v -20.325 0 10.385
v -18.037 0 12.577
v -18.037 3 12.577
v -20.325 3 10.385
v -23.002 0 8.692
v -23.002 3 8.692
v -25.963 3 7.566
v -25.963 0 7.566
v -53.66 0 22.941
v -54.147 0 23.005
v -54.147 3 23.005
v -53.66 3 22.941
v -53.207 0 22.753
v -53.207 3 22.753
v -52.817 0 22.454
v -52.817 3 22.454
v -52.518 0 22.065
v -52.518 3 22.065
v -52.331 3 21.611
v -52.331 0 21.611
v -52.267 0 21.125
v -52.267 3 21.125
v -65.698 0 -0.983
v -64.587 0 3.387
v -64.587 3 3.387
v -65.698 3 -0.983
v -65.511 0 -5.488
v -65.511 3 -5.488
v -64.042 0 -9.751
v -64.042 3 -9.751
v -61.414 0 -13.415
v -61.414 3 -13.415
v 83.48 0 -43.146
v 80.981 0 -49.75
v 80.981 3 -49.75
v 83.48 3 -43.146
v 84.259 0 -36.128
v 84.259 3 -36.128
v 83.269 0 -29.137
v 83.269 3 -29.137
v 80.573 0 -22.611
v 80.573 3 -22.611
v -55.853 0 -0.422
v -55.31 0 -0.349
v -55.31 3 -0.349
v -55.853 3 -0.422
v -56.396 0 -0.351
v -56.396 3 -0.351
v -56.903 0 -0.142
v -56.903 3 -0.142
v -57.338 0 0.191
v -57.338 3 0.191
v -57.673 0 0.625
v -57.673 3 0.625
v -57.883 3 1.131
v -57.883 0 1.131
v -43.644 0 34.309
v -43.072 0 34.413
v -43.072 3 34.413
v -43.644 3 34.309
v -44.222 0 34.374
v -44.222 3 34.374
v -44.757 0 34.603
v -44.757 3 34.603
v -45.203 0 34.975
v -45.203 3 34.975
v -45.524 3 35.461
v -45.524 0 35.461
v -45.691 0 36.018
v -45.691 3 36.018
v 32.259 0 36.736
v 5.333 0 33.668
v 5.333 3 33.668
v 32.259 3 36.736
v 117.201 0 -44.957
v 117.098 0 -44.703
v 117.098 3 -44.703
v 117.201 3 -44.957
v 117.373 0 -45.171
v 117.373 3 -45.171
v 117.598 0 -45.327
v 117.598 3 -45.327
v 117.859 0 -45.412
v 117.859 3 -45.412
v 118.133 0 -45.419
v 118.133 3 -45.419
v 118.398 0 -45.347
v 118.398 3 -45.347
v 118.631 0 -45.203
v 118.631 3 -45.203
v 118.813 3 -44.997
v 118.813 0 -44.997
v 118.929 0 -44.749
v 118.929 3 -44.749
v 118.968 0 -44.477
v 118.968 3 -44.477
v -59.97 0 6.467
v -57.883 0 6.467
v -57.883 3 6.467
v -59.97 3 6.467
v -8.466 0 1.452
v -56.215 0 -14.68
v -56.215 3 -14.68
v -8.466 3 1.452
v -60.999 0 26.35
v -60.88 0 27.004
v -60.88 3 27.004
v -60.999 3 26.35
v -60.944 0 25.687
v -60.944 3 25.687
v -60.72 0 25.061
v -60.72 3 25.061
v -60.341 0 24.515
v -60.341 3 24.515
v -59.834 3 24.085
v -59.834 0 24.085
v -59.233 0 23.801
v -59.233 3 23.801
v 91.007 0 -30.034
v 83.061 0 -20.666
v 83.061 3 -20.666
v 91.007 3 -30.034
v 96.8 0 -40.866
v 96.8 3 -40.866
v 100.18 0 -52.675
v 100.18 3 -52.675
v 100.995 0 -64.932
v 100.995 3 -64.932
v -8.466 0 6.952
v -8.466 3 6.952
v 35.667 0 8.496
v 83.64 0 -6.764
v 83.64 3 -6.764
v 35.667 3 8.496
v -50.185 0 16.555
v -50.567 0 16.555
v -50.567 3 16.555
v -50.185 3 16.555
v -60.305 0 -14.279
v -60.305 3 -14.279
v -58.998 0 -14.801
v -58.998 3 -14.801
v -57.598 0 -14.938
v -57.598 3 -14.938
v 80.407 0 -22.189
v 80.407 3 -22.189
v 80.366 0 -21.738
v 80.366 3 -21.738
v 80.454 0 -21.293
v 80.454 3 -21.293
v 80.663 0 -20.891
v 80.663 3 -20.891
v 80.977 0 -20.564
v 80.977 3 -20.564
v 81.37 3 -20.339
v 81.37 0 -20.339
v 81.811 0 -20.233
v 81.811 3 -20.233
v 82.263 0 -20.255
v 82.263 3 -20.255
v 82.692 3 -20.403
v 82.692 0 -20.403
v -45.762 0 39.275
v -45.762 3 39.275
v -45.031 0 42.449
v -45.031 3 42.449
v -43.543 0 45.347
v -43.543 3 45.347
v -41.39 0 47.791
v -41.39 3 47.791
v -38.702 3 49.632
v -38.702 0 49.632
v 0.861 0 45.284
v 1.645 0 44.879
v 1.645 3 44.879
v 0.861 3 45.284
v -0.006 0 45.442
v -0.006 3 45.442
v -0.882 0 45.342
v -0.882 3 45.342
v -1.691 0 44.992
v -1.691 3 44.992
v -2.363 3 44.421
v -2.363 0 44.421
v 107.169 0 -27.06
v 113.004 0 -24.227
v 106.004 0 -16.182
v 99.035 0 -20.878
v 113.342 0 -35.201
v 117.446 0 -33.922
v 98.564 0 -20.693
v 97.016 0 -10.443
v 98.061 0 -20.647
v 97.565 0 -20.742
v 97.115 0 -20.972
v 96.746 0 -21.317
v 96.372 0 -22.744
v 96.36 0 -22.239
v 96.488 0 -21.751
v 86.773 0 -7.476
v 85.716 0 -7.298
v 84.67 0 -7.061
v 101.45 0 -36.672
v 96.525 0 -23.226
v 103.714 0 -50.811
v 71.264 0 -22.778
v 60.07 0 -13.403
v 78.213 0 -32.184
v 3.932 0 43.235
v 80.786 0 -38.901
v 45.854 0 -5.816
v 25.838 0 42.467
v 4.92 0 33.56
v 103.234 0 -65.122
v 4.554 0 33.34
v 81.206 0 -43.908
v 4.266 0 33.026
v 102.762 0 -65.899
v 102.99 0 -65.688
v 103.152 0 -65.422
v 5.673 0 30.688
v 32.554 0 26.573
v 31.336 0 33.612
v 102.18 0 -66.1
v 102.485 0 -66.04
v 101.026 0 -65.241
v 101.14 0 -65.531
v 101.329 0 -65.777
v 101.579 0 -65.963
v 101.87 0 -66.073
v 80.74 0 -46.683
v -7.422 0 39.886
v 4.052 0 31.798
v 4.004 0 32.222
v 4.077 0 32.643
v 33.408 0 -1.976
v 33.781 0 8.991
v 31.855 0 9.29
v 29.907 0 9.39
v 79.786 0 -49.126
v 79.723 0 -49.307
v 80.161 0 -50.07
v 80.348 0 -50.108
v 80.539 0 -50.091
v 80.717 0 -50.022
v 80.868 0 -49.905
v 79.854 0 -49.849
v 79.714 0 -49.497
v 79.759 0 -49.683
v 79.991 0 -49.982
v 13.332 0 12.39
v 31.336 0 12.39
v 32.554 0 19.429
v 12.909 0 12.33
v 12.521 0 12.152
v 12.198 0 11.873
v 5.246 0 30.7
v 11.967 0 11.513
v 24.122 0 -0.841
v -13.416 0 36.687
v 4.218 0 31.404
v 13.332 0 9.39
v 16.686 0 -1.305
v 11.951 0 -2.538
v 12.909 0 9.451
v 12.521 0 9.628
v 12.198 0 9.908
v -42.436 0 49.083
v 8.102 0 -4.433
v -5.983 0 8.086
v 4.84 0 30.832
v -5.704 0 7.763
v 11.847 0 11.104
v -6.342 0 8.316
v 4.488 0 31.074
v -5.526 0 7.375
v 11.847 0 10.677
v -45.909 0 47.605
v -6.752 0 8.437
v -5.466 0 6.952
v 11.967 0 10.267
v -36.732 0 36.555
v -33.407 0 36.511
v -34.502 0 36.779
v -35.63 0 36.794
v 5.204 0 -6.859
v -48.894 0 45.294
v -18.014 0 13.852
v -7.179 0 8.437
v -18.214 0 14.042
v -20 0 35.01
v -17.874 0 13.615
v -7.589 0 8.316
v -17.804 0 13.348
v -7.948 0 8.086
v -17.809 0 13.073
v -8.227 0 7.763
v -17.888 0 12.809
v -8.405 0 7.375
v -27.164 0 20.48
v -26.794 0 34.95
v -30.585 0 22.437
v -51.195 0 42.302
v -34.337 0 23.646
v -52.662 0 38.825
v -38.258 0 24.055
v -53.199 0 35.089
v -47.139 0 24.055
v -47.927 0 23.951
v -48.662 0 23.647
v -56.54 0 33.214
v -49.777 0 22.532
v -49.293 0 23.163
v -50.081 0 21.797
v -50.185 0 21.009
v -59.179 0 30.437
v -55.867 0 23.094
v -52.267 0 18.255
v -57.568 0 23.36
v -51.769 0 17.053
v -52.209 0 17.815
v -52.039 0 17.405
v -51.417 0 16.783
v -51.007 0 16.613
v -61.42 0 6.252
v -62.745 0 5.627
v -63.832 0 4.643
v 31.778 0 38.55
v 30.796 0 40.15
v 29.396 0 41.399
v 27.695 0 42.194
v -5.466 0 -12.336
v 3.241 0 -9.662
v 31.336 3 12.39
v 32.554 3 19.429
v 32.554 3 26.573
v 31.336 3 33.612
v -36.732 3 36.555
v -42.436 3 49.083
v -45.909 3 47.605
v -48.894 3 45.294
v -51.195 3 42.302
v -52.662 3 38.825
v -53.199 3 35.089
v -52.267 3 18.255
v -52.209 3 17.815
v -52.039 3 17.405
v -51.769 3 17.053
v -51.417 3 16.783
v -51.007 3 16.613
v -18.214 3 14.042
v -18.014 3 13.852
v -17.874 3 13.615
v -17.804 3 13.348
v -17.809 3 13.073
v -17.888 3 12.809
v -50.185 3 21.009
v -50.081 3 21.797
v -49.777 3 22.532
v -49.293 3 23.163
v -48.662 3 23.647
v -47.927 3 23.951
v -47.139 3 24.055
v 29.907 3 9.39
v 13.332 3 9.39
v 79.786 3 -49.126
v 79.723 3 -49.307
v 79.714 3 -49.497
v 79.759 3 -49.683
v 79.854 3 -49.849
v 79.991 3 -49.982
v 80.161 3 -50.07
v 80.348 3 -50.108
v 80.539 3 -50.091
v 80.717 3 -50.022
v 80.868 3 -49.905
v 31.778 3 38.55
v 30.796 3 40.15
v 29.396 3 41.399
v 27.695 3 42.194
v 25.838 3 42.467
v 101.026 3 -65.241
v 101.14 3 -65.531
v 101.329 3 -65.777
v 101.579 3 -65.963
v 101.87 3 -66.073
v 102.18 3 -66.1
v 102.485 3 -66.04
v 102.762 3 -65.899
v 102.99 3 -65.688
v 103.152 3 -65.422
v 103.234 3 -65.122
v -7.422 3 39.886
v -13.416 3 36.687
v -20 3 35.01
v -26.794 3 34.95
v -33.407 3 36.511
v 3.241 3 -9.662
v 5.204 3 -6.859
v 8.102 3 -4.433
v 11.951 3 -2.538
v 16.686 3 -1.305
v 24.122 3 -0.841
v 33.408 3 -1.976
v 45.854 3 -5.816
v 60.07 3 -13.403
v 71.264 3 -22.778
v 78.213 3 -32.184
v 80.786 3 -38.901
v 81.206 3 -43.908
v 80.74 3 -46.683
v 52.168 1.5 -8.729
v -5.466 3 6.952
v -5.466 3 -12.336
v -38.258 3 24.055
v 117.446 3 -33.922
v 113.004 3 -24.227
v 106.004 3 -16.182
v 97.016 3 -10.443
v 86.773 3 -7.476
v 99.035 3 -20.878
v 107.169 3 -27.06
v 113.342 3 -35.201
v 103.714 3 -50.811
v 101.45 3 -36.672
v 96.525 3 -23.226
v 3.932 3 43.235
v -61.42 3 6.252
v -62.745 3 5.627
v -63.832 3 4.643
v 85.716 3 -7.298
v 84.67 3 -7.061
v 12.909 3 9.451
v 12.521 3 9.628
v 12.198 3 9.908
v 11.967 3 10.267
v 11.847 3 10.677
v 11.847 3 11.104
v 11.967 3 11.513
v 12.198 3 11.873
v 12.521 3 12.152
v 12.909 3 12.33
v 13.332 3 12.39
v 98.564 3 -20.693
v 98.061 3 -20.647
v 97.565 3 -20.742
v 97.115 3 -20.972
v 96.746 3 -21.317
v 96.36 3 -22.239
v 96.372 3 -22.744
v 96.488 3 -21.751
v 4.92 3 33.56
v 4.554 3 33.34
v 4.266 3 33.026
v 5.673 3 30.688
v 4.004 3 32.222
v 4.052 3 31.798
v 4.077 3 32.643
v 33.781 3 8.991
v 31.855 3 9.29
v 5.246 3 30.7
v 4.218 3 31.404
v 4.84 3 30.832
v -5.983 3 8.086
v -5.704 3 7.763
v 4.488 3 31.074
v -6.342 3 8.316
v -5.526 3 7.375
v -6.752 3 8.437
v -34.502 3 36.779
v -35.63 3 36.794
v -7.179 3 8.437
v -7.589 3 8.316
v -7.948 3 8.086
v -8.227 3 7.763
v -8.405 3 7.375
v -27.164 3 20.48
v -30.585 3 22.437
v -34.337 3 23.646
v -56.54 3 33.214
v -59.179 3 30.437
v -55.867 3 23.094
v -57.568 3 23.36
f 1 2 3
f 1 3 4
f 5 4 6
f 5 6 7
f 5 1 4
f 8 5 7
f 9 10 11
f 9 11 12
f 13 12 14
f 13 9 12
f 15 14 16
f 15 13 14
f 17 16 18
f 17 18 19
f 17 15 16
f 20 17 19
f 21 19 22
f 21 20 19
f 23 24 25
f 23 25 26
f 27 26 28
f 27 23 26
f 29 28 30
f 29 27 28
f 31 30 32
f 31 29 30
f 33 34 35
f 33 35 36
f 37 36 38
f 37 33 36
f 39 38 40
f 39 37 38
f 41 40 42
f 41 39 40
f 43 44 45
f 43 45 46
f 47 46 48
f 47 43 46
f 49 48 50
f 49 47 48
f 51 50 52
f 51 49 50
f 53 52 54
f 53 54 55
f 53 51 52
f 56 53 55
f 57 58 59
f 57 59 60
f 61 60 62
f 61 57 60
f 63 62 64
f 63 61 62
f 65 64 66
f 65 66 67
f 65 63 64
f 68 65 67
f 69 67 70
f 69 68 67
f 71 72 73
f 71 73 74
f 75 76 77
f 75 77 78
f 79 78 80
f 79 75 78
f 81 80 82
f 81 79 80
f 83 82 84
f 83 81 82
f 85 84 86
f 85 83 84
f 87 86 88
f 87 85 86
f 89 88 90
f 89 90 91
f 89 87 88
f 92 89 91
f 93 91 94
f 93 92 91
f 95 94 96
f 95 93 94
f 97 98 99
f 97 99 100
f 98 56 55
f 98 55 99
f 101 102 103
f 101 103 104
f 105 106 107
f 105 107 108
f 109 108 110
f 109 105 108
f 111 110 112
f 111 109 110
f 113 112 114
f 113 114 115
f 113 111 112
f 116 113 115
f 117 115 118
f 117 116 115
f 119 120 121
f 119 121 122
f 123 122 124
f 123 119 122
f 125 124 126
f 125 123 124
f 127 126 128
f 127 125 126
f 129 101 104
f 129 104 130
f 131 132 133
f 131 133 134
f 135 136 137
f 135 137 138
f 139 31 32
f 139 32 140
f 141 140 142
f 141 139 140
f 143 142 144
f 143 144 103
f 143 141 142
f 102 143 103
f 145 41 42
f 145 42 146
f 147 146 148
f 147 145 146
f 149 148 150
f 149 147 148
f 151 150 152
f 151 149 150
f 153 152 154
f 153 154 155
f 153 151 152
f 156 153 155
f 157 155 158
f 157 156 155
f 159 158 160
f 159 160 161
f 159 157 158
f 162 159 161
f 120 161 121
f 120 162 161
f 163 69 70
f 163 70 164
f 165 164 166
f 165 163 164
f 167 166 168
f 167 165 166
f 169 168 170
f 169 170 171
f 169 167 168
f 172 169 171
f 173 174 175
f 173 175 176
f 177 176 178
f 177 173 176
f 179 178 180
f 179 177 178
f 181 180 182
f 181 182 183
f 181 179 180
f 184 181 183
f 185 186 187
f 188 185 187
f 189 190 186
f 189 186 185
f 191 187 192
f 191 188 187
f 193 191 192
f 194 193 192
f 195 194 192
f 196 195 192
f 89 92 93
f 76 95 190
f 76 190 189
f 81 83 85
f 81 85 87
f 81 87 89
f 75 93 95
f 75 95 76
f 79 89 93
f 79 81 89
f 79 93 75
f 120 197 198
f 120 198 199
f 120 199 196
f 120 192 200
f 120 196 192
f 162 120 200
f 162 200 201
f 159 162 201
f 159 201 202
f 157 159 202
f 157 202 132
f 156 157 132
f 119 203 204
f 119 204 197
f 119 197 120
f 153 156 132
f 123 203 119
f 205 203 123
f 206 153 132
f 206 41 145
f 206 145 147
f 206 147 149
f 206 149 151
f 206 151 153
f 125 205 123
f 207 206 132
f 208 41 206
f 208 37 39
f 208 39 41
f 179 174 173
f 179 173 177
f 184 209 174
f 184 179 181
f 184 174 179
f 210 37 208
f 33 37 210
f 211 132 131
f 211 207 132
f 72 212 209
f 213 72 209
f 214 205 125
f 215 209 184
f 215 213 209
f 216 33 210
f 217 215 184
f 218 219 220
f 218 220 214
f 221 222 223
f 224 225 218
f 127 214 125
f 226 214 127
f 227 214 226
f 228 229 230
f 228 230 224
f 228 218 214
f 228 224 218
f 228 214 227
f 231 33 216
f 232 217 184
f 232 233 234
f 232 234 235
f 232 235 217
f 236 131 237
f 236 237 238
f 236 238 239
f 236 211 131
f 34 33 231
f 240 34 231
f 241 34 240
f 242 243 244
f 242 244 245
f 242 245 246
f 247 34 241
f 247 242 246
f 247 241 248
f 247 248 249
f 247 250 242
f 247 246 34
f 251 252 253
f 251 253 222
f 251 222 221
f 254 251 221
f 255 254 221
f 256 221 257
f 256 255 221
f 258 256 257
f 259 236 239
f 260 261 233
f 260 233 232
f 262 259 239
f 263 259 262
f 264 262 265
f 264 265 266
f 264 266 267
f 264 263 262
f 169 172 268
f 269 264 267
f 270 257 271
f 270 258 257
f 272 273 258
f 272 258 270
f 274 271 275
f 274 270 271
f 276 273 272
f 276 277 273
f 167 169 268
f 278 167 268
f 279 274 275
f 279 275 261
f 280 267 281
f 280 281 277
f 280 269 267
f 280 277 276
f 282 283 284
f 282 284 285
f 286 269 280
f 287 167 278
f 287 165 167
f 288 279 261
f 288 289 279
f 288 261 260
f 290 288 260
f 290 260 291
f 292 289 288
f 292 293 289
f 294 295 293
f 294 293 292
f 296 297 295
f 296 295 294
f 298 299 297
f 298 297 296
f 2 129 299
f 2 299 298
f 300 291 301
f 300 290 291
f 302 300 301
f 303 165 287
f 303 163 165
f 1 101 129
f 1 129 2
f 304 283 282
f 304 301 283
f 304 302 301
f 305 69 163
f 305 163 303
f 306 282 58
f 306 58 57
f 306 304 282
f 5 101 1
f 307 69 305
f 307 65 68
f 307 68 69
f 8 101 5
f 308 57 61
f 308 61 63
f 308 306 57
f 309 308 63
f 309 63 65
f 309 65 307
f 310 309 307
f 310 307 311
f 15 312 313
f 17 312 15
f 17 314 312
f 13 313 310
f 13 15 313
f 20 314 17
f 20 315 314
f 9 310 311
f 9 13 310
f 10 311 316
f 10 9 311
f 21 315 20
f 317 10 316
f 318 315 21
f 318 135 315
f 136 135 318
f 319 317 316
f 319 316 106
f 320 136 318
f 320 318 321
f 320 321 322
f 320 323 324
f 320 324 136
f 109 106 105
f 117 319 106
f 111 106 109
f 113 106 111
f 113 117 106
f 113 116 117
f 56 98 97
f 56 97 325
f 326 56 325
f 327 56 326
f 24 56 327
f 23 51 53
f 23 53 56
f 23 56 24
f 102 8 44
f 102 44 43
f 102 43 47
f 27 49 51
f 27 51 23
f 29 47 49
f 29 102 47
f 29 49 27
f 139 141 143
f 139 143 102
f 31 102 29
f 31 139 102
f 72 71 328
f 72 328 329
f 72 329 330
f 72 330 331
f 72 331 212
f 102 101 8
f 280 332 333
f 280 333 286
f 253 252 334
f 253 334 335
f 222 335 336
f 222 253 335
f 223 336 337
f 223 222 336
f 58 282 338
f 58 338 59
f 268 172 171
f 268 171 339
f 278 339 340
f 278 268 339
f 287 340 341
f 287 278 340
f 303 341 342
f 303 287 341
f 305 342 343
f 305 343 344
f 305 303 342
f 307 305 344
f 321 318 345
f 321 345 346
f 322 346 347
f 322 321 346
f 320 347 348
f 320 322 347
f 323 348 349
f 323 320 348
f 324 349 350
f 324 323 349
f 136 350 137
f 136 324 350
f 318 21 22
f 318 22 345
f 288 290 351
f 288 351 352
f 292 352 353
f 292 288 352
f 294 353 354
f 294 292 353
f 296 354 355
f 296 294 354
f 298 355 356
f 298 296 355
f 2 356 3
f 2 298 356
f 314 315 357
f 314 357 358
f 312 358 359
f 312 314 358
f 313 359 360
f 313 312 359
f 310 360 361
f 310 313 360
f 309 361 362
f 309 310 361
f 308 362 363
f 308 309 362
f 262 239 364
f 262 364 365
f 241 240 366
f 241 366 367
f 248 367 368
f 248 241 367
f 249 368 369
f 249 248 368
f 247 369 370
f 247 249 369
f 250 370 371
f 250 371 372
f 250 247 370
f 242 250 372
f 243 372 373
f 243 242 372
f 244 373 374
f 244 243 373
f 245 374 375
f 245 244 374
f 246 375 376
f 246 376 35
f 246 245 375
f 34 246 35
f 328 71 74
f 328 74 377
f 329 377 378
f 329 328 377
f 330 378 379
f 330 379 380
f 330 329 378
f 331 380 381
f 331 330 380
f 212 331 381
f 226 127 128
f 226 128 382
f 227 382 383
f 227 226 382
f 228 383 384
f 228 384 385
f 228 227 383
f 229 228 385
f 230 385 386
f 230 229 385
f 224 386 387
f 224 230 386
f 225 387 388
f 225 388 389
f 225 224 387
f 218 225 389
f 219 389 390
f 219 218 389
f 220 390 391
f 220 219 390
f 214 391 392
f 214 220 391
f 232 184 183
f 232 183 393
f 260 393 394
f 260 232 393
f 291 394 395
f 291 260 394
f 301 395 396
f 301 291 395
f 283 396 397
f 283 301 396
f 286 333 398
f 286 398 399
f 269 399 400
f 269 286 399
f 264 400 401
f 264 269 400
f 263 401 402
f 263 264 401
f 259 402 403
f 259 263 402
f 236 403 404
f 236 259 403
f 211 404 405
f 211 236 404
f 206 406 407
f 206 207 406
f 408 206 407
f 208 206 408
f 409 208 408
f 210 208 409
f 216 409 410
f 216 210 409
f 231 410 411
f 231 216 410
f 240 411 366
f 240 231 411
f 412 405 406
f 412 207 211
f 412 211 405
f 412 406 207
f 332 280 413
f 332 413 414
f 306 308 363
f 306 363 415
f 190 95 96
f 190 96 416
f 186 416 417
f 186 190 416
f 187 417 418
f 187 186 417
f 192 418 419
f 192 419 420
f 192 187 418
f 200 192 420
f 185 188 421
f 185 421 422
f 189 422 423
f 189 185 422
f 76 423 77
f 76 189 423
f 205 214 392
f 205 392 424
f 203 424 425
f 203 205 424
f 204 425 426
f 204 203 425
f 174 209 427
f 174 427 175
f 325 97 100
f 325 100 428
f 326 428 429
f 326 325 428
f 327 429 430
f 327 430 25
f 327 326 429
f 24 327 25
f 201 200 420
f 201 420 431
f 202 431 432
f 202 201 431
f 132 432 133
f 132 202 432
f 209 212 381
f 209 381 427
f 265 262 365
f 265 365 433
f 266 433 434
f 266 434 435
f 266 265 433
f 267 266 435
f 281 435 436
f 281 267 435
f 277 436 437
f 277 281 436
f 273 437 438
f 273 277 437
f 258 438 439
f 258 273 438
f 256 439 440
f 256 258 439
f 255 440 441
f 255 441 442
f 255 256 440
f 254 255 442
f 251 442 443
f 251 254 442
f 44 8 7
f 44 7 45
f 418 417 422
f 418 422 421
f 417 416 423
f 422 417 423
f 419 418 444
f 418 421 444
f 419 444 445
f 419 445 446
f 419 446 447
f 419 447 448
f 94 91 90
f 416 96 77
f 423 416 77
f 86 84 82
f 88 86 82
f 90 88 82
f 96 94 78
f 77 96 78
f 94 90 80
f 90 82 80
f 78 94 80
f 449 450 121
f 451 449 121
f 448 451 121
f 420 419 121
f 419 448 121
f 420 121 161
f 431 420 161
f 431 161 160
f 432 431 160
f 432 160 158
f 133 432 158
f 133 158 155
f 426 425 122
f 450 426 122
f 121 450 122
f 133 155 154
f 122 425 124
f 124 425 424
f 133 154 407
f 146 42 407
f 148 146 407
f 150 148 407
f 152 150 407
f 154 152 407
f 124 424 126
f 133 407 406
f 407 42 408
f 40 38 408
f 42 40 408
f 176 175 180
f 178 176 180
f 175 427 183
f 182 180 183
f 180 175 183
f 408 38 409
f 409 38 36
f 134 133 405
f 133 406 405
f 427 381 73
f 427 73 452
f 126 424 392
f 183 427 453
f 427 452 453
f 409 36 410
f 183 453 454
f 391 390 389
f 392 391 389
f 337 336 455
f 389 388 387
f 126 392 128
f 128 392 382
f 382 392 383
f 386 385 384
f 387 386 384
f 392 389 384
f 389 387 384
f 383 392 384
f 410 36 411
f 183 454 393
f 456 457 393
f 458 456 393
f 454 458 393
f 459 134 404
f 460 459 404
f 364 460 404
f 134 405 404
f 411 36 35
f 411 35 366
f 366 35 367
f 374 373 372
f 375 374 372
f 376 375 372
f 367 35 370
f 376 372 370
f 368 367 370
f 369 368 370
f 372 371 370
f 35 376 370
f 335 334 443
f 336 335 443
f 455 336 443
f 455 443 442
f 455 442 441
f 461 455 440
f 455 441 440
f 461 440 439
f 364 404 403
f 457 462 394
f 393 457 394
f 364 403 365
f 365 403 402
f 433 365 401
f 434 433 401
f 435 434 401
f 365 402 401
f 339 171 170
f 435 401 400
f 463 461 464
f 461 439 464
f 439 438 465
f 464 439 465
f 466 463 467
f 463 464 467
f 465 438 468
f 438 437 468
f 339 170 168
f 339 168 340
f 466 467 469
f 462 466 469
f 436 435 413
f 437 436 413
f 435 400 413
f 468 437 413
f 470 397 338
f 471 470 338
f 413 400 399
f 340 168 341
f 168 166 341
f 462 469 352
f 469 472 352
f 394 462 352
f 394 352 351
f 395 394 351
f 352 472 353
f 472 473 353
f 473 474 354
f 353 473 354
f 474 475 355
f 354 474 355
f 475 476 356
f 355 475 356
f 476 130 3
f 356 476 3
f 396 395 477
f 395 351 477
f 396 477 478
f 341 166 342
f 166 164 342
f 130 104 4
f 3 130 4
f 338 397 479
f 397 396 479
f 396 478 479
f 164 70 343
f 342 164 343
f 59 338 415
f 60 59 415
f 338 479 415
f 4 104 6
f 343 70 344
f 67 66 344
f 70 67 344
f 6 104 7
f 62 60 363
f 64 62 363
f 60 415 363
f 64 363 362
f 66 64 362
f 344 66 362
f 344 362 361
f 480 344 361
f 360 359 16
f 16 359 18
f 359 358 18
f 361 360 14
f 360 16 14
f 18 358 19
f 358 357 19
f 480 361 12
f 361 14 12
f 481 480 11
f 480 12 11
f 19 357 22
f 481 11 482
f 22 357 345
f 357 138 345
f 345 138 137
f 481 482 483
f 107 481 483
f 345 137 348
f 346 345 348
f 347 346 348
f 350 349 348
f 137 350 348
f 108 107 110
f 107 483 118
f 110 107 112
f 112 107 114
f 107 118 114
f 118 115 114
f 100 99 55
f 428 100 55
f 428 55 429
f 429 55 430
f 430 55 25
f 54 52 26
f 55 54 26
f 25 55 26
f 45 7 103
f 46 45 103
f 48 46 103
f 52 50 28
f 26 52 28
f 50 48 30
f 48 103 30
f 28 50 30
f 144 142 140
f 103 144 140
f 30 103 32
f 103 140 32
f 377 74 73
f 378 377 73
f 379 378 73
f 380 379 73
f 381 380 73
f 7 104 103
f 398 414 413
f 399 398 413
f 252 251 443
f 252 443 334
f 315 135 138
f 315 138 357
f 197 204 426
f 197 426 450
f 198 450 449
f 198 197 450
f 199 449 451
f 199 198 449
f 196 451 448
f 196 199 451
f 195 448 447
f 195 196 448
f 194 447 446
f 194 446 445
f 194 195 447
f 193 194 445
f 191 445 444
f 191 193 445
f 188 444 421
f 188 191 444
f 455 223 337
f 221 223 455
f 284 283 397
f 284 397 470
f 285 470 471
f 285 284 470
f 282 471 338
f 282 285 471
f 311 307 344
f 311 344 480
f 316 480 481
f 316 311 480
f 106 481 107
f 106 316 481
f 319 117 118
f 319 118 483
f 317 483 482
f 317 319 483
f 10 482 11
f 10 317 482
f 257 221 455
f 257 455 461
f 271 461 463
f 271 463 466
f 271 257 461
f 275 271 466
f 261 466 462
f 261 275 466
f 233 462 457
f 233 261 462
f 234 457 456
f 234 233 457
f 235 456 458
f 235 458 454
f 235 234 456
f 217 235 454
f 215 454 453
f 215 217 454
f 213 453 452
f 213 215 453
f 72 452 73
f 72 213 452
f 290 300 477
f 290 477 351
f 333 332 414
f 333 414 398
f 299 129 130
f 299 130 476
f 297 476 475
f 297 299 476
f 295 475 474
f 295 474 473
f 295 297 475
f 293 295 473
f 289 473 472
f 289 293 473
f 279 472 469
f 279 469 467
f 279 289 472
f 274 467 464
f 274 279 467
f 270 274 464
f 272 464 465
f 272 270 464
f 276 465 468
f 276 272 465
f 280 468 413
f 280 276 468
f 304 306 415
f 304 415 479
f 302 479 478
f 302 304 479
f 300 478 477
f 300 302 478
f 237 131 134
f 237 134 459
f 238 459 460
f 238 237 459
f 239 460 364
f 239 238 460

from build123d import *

# Parameters (mm, degrees)
BOSS_EXTRUDE2_DEPTH = 3


with BuildPart() as part:
    # Sketch1 → Boss-Extrude2 (new body)
    with BuildSketch(Plane(origin=(0, 0, 0), x_dir=(1, 0, 0), z_dir=(0, 1, 0))):
        with BuildLine():
            Line((83.639689367, 6.764475065), (35.667186692, -8.49628906))
            ThreePointArc((35.667186692, -8.49628906), (32.821791297, -9.165503452), (29.907418735, -9.39034879))
            Line((29.907418735, -9.39034879), (13.331621464, -9.39034879))
            ThreePointArc((13.331621464, -9.39034879), (11.831621464, -10.89034879), (13.331621464, -12.39034879))
            Line((13.331621464, -12.39034879), (31.335553361, -12.39034879))
            ThreePointArc((31.335553361, -12.39034879), (32.706920816, -23.000925987), (31.335553361, -33.611503185))
            Line((31.335553361, -33.611503185), (5.672878156, -30.687610674))
            ThreePointArc((5.672878156, -30.687610674), (4.012715552, -32.008163637), (5.333268515, -33.668326241))
            Line((5.333268515, -33.668326241), (32.258758745, -36.73609835))
            ThreePointArc((32.258758745, -36.73609835), (30.141236011, -40.825580171), (25.83833159, -42.466548678))
            Line((25.83833159, -42.466548678), (3.931607644, -43.234741077))
            Line((3.931607644, -43.234741077), (1.645004408, -44.879459267))
            ThreePointArc((1.645004408, -44.879459267), (-0.44755249, -45.424610965), (-2.363050322, -44.421190413))
            ThreePointArc((-2.363050322, -44.421190413), (-16.657617756, -35.649988568), (-33.406545395, -36.511419261))
            ThreePointArc((-33.406545395, -36.511419261), (-35.065515769, -36.818007167), (-36.732015424, -36.555409102))
            Line((-36.732015424, -36.555409102), (-43.072013441, -34.41346595))
            ThreePointArc((-43.072013441, -34.41346595), (-44.756883472, -34.602804193), (-45.690953078, -36.017777677))
            ThreePointArc((-45.690953078, -36.017777677), (-44.377060251, -43.944176391), (-38.701961301, -49.631650596))
            ThreePointArc((-38.701961301, -49.631650596), (-48.89375638, -45.294039559), (-53.199015105, -35.088535957))
            ThreePointArc((-53.199015105, -35.088535957), (-57.963880411, -31.924307539), (-60.880420097, -27.003933658))
            ThreePointArc((-60.880420097, -27.003933658), (-60.719986784, -25.061085947), (-59.232742508, -23.80072864))
            ThreePointArc((-59.232742508, -23.80072864), (-56.720776297, -23.205324241), (-54.14697512, -23.005253893))
            ThreePointArc((-54.14697512, -23.005253893), (-52.817288904, -22.454479829), (-52.26651484, -21.124793613))
            Line((-52.26651484, -21.124793613), (-52.26651484, -18.255253893))
            ThreePointArc((-52.26651484, -18.255253893), (-51.768596368, -17.053172365), (-50.56651484, -16.555253893))
            Line((-50.56651484, -16.555253893), (-50.18504008, -16.555253893))
            Line((-50.18504008, -16.555253893), (-50.18504008, -21.008976099))
            ThreePointArc((-50.18504008, -21.008976099), (-49.292805972, -23.163019785), (-47.138762286, -24.055253893))
            Line((-47.138762286, -24.055253893), (-38.258057554, -24.055253893))
            ThreePointArc((-38.258057554, -24.055253893), (-32.429820226, -23.139270307), (-27.163537606, -20.479638066))
            Line((-27.163537606, -20.479638066), (-18.213895237, -14.042299326))
            ThreePointArc((-18.213895237, -14.042299326), (-17.803794916, -13.348327859), (-18.036830501, -12.576658832))
            ThreePointArc((-18.036830501, -12.576658832), (-21.621060958, -9.471725354), (-25.963310125, -7.565894288))
            Line((-25.963310125, -7.565894288), (-55.30954126, 0.349304832))
            ThreePointArc((-55.30954126, 0.349304832), (-56.903028243, 0.142191478), (-57.883342437, -1.131025232))
            Line((-57.883342437, -1.131025232), (-57.883342437, -6.467193959))
            Line((-57.883342437, -6.467193959), (-59.970418868, -6.467193959))
            ThreePointArc((-59.970418868, -6.467193959), (-62.745333472, -5.626502668), (-64.58710946, -3.387133535))
            ThreePointArc((-64.58710946, -3.387133535), (-65.510981808, 5.487804074), (-61.413967112, 13.414501258))
            ThreePointArc((-61.413967112, 13.414501258), (-58.998069827, 14.801189981), (-56.215124926, 14.680016601))
            Line((-56.215124926, 14.680016601), (-8.465601761, -1.451970173))
            Line((-8.465601761, -1.451970173), (-8.465601761, -6.951970173))
            ThreePointArc((-8.465601761, -6.951970173), (-6.965601761, -8.451970173), (-5.465601761, -6.951970173))
            Line((-5.465601761, -6.951970173), (-5.465601761, 12.336199013))
            Line((-5.465601761, 12.336199013), (3.240530108, 9.661679805))
            add(Edge.make_bspline(
                [(3.240530108, 9.661679805), (13.894797432, -11.003486244), (52.167573777, 8.728675087), (90.440350123, 28.460836418), (79.7860828, 49.126002466)],
                knots=[0, 0, 0, 1.570796327, 1.570796327, 3.141592654, 3.141592654, 3.141592654], degree=2, weights=[1, 0.707106781, 1, 0.707106781, 1]))
            ThreePointArc((79.7860828, 49.126002466), (80.072864648, 50.032062802), (80.980537261, 49.750425469))
            ThreePointArc((80.980537261, 49.750425469), (84.258913327, 36.128474368), (80.573020022, 22.611096962))
            ThreePointArc((80.573020022, 22.611096962), (80.977131886, 20.56443692), (83.060820169, 20.666254716))
            ThreePointArc((83.060820169, 20.666254716), (96.799731472, 40.865743936), (100.995247842, 64.931792447))
            ThreePointArc((100.995247842, 64.931792447), (102.023911204, 66.097176073), (103.234366802, 65.121950687))
            ThreePointArc((103.234366802, 65.121950687), (102.922479327, 43.686615501), (96.524889391, 23.225879655))
            ThreePointArc((96.524889391, 23.225879655), (96.918331366, 21.131130375), (99.034577715, 20.877610113))
            ThreePointArc((99.034577715, 20.877610113), (110.533106389, 30.92010294), (117.098161764, 44.70298623))
            ThreePointArc((117.098161764, 44.70298623), (118.133339849, 45.419031095), (118.968319872, 44.477159407))
            ThreePointArc((118.968319872, 44.477159407), (109.792721336, 19.953626833), (86.773007072, 7.476126539))
            ThreePointArc((86.773007072, 7.476126539), (85.19127768, 7.186654615), (83.639689367, 6.764475065))
        make_face()
    extrude(amount=BOSS_EXTRUDE2_DEPTH)


solid = part.part
